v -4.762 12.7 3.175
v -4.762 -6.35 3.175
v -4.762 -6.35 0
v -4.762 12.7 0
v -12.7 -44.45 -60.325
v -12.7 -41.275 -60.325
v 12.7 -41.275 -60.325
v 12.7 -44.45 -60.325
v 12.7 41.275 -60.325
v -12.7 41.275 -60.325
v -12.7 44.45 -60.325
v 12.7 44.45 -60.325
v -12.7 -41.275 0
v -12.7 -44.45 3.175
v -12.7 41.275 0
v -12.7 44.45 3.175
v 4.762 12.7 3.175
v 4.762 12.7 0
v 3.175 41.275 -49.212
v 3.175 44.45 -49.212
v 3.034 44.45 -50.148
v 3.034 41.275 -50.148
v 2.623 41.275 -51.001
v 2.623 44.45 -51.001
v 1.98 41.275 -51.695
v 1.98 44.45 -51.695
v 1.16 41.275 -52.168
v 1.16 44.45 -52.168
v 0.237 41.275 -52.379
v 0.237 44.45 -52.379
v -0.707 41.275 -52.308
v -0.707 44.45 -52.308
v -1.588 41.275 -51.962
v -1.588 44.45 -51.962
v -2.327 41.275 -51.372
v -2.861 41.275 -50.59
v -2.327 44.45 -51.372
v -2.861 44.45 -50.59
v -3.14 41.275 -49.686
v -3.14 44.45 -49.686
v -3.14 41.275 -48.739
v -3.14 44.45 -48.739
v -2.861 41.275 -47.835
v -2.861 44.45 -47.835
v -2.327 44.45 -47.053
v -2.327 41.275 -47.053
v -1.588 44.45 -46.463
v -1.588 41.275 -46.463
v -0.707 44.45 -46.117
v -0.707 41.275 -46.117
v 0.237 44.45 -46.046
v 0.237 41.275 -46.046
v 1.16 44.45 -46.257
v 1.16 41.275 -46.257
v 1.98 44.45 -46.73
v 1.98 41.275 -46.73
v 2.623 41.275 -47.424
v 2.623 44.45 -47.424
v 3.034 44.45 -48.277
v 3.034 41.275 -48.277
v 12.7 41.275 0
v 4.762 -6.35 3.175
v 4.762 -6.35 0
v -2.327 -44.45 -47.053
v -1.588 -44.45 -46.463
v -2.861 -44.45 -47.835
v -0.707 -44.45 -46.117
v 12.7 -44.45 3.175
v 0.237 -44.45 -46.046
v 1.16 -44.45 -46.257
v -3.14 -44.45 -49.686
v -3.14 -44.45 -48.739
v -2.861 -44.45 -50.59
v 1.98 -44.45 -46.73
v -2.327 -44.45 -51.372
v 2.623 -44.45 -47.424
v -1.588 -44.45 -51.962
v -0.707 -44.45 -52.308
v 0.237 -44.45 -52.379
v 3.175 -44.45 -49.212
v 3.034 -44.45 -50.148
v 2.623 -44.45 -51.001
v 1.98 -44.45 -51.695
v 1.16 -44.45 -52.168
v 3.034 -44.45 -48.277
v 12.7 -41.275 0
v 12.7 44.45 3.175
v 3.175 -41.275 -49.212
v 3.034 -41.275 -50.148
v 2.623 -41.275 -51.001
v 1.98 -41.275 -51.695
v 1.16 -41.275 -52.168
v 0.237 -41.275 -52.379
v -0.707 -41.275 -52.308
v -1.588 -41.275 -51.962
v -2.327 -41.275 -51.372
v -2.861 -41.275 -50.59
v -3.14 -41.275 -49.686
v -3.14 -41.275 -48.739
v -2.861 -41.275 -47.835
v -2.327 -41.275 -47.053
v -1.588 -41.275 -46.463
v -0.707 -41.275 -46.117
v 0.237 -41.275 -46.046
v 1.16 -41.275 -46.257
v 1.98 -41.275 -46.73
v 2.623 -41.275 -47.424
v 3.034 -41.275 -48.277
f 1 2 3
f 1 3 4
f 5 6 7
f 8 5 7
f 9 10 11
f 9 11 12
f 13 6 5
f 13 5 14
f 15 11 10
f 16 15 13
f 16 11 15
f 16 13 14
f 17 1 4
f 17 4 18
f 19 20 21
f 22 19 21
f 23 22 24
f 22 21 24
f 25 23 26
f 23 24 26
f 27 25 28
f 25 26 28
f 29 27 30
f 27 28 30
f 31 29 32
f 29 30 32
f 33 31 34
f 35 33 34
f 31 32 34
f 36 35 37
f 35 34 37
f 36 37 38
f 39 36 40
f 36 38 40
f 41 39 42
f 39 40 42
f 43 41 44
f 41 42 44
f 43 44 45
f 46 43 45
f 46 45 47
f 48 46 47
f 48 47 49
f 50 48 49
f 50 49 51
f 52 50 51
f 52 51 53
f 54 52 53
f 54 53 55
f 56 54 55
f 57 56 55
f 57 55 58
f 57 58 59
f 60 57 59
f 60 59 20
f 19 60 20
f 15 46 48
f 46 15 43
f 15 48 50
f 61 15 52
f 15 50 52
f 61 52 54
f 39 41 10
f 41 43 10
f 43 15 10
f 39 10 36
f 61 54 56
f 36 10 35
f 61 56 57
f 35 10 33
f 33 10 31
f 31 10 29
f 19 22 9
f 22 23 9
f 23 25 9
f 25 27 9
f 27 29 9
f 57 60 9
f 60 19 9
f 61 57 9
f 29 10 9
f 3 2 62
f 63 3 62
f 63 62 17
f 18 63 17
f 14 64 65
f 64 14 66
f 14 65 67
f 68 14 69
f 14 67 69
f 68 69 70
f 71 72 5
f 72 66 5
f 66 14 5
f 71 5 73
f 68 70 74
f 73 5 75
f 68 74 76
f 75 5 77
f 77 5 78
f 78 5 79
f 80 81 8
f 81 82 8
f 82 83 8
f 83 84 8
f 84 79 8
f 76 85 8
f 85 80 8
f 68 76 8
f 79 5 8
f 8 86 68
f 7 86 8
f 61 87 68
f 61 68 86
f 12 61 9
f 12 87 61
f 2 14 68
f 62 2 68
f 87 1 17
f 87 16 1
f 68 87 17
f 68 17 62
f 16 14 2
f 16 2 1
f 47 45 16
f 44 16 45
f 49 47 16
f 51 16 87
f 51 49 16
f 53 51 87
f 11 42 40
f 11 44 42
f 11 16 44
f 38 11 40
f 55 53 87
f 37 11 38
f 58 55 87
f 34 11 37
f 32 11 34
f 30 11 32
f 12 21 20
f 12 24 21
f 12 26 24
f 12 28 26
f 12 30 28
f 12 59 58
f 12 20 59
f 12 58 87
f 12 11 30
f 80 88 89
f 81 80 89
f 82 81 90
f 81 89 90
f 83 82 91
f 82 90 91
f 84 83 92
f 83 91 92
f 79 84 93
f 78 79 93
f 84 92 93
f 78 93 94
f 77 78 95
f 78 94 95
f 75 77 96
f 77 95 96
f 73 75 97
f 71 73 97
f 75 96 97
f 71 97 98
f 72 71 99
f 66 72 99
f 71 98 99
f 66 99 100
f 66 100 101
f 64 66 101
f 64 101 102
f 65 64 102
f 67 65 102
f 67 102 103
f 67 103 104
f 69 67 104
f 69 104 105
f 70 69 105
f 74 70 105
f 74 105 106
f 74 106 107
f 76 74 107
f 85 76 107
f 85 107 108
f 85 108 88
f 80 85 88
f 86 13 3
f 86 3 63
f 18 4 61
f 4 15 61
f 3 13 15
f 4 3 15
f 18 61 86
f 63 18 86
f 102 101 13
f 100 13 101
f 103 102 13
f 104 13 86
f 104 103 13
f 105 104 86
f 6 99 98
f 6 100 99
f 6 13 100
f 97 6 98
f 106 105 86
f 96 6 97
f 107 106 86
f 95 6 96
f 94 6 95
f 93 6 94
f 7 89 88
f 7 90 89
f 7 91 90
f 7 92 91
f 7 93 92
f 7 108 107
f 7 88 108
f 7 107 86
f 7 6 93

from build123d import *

# Parameters (mm, degrees)
SKETCH1_W           = 25.4
SKETCH1_H           = 82.55
BOSS_EXTRUDE1_DEPTH = 3.175
SKETCH2_W           = 25.4
SKETCH2_H           = 3.175
SKETCH2_H_2         = 60.325
BOSS_EXTRUDE2_DEPTH = 3.175
SKETCH5_W           = 9.525
SKETCH5_H           = 19.05
CUT_EXTRUDE2_DEPTH  = 64.5
SKETCH6_R           = 3.175
CUT_EXTRUDE3_DEPTH  = 89.9


with BuildPart() as part:
    # Sketch1 → Boss-Extrude1 (new body)
    with BuildSketch(Plane.XY):
        Rectangle(SKETCH1_W, SKETCH1_H)
    extrude(amount=BOSS_EXTRUDE1_DEPTH)

    # Sketch2 → Boss-Extrude2 (add)
    with BuildSketch(Plane(origin=(0, 41.275, 0), x_dir=(1, 0, 0), z_dir=(0, 1, 0))):
        with Locations((0, -1.5875)):
            Rectangle(SKETCH2_W, SKETCH2_H)
        with Locations((0, 30.1625)):
            Rectangle(SKETCH2_W, SKETCH2_H_2)
    boss_extrude2 = extrude(amount=BOSS_EXTRUDE2_DEPTH)

    # Sketch5 → Cut-Extrude2 (cut, through all)
    with BuildSketch(Plane.XY.offset(3.175)):
        with Locations((0, 3.175)):
            Rectangle(SKETCH5_W, SKETCH5_H)
    extrude(amount=-CUT_EXTRUDE2_DEPTH, mode=Mode.SUBTRACT)

    # Mirror1: Boss-Extrude2 across plane
    add(boss_extrude2.mirror(Plane.ZX))

    # Sketch6 → Cut-Extrude3 (cut, through all)
    with BuildSketch(Plane(origin=(0, 44.45, 0), x_dir=(1, 0, 0), z_dir=(0, 1, 0))):
        with Locations((0, 49.2125)):
            Circle(SKETCH6_R)
    extrude(amount=-CUT_EXTRUDE3_DEPTH, mode=Mode.SUBTRACT)


solid = part.part
